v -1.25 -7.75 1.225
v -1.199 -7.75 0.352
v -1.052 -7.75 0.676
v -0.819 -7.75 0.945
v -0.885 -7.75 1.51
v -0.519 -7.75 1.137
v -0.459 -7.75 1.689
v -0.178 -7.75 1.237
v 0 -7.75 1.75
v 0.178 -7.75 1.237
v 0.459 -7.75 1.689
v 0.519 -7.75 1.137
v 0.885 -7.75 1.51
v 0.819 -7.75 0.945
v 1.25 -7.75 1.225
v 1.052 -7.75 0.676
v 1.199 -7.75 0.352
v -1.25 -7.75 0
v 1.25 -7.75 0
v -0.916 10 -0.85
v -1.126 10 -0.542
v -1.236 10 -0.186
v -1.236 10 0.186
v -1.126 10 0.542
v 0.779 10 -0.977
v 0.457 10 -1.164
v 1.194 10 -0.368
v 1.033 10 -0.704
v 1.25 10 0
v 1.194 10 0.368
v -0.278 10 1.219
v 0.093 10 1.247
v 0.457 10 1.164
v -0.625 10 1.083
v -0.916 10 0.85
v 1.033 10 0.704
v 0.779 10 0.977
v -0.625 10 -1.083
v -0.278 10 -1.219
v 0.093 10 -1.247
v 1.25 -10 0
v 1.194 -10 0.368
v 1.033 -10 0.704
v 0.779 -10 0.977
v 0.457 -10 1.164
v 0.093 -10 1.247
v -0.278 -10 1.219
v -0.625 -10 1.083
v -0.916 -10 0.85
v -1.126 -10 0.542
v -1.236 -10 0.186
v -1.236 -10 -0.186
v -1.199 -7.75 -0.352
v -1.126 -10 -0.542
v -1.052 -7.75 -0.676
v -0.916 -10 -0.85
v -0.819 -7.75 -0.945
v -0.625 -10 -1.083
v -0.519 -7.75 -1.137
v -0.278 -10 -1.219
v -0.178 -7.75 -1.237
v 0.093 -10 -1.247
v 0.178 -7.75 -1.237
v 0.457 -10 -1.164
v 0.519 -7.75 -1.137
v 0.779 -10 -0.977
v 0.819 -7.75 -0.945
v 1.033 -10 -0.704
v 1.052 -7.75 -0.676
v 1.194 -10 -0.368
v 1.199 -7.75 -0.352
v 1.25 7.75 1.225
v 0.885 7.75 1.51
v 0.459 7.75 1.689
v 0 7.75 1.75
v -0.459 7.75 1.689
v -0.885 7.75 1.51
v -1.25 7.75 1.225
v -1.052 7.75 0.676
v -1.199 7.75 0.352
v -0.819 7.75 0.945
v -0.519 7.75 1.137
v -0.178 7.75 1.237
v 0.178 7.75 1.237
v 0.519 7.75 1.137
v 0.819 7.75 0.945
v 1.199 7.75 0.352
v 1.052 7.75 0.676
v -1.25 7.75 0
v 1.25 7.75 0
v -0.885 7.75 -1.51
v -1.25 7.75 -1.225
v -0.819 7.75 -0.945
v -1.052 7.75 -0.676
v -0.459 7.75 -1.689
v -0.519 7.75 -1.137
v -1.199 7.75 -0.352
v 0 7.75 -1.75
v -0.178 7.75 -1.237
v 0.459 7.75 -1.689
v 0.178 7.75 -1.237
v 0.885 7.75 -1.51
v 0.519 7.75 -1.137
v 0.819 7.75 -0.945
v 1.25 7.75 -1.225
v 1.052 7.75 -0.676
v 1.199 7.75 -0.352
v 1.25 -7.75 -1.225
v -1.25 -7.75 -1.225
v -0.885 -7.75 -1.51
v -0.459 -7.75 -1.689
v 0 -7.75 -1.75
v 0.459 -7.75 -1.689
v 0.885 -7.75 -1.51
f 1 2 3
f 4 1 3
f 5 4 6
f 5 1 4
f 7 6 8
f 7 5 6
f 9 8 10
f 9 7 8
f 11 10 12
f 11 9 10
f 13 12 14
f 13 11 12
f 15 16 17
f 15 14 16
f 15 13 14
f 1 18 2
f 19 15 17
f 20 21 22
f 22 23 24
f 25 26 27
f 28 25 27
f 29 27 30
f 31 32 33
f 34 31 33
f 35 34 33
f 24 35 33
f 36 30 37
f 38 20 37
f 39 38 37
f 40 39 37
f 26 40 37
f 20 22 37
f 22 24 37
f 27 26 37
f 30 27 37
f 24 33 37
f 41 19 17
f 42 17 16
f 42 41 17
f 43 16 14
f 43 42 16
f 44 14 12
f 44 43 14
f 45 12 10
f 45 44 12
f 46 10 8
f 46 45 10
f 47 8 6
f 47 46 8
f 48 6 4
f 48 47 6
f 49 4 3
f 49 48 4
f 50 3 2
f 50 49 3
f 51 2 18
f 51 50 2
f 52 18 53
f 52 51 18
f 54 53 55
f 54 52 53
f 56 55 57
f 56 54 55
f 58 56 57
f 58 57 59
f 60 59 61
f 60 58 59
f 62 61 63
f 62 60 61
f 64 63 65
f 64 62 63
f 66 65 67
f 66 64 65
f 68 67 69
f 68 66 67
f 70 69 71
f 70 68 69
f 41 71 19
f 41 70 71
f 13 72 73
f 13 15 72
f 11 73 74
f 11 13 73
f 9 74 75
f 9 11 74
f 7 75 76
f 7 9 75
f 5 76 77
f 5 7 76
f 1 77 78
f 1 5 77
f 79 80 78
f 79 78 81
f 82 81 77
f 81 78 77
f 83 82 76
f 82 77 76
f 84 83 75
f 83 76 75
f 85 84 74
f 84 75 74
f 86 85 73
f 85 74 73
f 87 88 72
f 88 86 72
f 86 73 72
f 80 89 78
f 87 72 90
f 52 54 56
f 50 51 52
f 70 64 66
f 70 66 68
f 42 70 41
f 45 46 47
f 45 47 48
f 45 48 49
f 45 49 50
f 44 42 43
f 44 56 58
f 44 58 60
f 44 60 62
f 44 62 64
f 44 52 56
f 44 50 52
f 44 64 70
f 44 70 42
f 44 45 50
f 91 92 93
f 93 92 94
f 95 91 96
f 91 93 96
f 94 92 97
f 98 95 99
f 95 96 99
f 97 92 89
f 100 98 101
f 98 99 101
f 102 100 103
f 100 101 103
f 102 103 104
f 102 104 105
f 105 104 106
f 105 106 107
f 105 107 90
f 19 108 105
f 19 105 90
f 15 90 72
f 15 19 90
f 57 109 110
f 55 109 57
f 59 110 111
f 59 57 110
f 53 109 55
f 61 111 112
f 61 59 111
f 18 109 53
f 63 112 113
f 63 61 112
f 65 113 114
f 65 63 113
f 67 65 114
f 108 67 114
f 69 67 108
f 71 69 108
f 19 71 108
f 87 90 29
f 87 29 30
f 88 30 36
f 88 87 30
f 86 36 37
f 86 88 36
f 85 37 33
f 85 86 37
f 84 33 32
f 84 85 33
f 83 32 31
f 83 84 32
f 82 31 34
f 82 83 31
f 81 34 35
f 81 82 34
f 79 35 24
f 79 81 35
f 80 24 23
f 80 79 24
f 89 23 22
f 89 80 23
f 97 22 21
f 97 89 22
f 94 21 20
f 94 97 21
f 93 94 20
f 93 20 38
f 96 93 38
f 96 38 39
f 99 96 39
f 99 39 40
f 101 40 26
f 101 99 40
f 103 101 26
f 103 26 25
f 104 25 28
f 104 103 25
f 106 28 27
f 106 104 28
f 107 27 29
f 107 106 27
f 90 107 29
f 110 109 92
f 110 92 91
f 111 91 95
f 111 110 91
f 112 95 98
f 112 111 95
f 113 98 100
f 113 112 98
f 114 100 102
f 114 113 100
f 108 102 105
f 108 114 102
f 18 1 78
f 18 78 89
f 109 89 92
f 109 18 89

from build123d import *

# Parameters (mm, degrees)
F1_DEPTH = 7.75
F2_R     = 1.25
F3_DEPTH = 10


with BuildPart() as f1:
    # F0 (on Front) → F1 (new body, symmetric)
    with BuildSketch(Plane.XZ):
        with BuildLine():
            Line((-1.25, 1.224745), (-1.25, -1.224745))
            ThreePointArc((-1.25, -1.224745), (0, -1.75), (1.25, -1.224745))
            Line((1.25, -1.224745), (1.25, 1.224745))
            ThreePointArc((1.25, 1.224745), (0, 1.75), (-1.25, 1.224745))
        make_face()
    extrude(amount=F1_DEPTH, both=True)

    # F2 (on Front) → F3 (join, symmetric)
    with BuildSketch(Plane.XZ):
        Circle(F2_R)
    extrude(amount=F3_DEPTH, both=True)


solid = f1.part
